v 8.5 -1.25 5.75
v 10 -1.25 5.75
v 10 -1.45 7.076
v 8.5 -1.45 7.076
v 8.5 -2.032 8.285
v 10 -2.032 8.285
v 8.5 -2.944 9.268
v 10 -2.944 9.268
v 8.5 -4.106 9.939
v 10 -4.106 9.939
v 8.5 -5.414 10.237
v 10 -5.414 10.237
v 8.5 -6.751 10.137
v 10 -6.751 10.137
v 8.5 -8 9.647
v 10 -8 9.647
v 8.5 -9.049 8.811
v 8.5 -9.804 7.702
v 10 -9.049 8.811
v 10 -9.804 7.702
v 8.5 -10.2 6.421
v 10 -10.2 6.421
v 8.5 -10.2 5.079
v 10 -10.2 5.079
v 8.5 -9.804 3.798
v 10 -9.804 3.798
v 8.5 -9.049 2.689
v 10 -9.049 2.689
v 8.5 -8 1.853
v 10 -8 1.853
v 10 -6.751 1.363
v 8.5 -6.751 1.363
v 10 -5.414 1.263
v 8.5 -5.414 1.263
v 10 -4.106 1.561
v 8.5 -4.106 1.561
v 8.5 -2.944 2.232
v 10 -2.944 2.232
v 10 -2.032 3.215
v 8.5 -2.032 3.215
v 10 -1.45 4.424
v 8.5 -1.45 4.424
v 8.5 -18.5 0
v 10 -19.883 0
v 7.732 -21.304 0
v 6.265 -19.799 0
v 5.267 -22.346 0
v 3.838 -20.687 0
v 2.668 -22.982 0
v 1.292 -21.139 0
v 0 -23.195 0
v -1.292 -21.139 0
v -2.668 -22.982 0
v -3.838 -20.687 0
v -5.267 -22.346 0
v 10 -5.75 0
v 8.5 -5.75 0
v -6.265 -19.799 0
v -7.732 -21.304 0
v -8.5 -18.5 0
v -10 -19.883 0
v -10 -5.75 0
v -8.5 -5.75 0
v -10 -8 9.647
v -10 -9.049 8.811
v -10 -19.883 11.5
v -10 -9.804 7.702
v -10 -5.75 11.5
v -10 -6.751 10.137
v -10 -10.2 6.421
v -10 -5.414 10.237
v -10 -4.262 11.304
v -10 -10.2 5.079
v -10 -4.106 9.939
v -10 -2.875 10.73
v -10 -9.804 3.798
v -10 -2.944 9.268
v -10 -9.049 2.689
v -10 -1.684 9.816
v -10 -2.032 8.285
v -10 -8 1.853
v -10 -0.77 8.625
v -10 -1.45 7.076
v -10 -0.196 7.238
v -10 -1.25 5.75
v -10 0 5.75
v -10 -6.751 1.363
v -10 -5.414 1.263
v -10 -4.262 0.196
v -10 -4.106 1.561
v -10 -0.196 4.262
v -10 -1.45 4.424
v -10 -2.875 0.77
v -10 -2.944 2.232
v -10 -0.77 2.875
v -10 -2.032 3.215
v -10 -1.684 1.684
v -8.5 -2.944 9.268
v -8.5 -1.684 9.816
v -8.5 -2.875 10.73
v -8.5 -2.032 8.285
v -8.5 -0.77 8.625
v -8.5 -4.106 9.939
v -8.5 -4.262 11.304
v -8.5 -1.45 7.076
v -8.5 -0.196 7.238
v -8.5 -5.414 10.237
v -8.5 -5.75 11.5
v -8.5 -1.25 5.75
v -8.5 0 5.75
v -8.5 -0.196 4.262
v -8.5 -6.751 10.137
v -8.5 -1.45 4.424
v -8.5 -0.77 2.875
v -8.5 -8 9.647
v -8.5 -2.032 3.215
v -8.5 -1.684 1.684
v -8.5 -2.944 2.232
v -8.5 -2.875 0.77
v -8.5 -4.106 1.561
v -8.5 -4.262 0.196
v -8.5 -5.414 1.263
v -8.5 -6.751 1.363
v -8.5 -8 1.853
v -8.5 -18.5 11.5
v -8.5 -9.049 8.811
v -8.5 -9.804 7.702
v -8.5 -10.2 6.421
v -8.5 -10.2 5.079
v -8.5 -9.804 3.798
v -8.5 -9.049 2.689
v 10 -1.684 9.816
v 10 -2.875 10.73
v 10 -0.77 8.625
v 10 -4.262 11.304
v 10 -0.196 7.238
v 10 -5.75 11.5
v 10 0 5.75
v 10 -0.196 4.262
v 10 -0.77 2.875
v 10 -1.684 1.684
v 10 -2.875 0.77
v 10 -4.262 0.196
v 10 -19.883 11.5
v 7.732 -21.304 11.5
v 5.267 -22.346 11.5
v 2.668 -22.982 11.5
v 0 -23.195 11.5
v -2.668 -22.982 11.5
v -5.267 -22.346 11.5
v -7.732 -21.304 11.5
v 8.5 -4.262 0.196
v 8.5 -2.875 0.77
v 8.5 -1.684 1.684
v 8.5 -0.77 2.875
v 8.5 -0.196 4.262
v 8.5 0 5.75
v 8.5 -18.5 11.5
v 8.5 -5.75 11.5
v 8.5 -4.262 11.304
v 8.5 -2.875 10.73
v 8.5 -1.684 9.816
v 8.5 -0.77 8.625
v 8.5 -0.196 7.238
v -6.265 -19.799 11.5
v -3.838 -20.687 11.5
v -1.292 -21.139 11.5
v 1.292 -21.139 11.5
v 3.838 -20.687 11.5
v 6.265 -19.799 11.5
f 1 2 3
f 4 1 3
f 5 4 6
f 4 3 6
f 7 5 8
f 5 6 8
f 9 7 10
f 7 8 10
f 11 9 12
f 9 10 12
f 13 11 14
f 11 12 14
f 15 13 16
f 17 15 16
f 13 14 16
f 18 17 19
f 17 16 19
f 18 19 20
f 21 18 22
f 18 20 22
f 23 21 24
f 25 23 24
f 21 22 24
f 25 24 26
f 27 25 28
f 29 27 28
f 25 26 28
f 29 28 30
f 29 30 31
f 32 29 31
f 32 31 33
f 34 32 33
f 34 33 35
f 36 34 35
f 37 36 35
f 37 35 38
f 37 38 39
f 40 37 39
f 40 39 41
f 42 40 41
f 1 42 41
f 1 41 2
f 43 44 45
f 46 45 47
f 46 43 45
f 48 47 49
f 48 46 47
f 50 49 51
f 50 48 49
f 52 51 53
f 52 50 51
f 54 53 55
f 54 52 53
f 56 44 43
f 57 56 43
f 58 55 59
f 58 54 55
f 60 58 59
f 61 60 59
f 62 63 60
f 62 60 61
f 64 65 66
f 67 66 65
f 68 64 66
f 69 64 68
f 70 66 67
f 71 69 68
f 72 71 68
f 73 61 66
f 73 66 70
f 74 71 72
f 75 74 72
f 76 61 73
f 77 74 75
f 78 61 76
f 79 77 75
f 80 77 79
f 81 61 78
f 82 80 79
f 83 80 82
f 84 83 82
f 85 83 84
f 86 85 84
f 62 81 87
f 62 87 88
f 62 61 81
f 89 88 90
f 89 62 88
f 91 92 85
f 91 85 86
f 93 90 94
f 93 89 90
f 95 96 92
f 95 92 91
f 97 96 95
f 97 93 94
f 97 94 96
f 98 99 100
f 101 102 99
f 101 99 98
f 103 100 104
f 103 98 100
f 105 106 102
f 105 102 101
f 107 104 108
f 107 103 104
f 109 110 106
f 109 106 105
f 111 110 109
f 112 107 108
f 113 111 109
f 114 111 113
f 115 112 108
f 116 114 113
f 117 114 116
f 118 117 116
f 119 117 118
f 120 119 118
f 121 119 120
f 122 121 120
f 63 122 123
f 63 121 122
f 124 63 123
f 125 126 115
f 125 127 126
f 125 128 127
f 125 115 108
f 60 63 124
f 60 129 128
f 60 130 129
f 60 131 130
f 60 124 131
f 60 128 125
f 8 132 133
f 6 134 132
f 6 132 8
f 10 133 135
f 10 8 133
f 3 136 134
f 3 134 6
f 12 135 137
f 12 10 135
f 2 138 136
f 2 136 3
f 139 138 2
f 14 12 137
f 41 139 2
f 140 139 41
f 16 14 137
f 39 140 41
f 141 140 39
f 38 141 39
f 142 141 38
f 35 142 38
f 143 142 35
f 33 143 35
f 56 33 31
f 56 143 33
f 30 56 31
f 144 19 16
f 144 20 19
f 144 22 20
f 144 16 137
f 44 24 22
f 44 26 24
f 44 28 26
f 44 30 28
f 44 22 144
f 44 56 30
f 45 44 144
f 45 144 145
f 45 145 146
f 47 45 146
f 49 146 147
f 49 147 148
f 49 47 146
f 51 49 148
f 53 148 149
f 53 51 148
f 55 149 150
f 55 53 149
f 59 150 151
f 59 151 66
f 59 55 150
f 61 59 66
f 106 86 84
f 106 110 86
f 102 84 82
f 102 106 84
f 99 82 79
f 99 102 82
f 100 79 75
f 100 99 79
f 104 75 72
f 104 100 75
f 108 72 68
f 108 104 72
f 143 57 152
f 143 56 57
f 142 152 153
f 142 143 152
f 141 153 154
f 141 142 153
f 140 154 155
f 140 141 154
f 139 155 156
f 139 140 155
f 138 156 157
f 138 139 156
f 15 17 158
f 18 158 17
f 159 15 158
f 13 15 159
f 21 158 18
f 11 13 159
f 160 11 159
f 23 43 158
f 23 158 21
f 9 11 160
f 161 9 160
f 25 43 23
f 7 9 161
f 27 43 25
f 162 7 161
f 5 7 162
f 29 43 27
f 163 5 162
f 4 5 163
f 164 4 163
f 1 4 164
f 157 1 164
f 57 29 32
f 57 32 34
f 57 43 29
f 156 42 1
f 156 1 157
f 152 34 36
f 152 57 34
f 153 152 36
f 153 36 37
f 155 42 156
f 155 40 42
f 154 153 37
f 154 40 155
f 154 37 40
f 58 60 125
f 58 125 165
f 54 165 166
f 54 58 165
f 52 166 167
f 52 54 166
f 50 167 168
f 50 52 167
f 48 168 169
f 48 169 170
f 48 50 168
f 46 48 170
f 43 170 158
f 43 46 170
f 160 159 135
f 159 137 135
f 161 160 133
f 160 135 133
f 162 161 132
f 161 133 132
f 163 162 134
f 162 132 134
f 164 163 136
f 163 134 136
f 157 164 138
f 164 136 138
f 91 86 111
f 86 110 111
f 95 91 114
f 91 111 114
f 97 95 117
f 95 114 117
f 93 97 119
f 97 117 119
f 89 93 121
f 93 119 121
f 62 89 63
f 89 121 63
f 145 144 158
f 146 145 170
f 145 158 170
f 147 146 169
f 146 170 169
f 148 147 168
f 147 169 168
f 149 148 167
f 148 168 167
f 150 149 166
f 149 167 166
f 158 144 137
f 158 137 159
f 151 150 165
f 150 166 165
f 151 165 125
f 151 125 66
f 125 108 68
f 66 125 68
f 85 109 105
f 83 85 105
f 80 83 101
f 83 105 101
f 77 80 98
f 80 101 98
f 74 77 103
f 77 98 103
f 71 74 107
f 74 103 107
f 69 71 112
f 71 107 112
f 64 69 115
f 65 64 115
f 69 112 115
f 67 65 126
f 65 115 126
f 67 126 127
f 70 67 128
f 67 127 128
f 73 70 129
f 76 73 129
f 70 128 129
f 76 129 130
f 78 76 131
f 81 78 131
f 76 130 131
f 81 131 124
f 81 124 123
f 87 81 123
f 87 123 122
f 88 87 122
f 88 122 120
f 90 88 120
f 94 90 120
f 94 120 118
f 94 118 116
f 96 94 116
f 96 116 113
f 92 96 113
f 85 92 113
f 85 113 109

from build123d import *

# Parameters (mm, degrees)
BOSS_EXTRU_1_DEPTH      = 11.5
ENL_V_MAT_EXTRU_1_REACH = 34.715
ESQUISSE3_R             = 4.5
CONG_1_R                = 5.75


with BuildPart() as part:
    # Esquisse1 → Boss.-Extru.1 (new body)
    with BuildSketch(Plane.XY):
        with BuildLine():
            Line((-10, 0), (-8.5, 0))
            Line((-8.5, 0), (-8.5, -18.5))
            ThreePointArc((-8.5, -18.5), (0, -21.195436549), (8.5, -18.5))
            Line((8.5, -18.5), (8.5, 0))
            Line((8.5, 0), (10, 0))
            Line((10, 0), (10, -19.882791199))
            ThreePointArc((10, -19.882791199), (0, -23.195436549), (-10, -19.882791199))
            Line((-10, -19.882791199), (-10, 0))
        make_face()
    extrude(amount=BOSS_EXTRU_1_DEPTH)

    # Enlèv. mat.-Extru.1: up to this face of the body (flat: up to its plane)
    enl_v_mat_extru_1_end = Plane(part.part.faces().sort_by_distance((-10, -9.9413956, 5.75))[0])
    # Esquisse3 → Enlèv. mat.-Extru.1 (cut, up to the picked face)
    with BuildSketch(Plane(origin=(10, 0, 0), x_dir=(0, 0, -1), z_dir=(1, 0, 0)), mode=Mode.PRIVATE) as enl_v_mat_extru_1_sk1:
        with Locations(Location((-5.75, -5.75, 0), (0, 0, 90))):
            Circle(ESQUISSE3_R)
    enl_v_mat_extru_1_tool1 = split(extrude(enl_v_mat_extru_1_sk1.sketch, amount=-ENL_V_MAT_EXTRU_1_REACH, mode=Mode.PRIVATE), bisect_by=enl_v_mat_extru_1_end, keep=Keep.BOTH, mode=Mode.PRIVATE)
    add(enl_v_mat_extru_1_tool1.solids().sort_by(Axis((10, -5.75, 5.75), (-1, 0, 0)))[0], mode=Mode.SUBTRACT)

    # Congé1
    cong_1_edges = [part.edges().sort_by_distance(p)[0] for p in [
        (-9.25, 0, 0),
        (-9.25, 0, 11.5),
        (9.25, 0, 0),
        (9.25, 0, 11.5),
    ]]
    fillet(cong_1_edges, radius=CONG_1_R - 0.0001)  # a hair under: the kernel refuses the full size


solid = part.part
